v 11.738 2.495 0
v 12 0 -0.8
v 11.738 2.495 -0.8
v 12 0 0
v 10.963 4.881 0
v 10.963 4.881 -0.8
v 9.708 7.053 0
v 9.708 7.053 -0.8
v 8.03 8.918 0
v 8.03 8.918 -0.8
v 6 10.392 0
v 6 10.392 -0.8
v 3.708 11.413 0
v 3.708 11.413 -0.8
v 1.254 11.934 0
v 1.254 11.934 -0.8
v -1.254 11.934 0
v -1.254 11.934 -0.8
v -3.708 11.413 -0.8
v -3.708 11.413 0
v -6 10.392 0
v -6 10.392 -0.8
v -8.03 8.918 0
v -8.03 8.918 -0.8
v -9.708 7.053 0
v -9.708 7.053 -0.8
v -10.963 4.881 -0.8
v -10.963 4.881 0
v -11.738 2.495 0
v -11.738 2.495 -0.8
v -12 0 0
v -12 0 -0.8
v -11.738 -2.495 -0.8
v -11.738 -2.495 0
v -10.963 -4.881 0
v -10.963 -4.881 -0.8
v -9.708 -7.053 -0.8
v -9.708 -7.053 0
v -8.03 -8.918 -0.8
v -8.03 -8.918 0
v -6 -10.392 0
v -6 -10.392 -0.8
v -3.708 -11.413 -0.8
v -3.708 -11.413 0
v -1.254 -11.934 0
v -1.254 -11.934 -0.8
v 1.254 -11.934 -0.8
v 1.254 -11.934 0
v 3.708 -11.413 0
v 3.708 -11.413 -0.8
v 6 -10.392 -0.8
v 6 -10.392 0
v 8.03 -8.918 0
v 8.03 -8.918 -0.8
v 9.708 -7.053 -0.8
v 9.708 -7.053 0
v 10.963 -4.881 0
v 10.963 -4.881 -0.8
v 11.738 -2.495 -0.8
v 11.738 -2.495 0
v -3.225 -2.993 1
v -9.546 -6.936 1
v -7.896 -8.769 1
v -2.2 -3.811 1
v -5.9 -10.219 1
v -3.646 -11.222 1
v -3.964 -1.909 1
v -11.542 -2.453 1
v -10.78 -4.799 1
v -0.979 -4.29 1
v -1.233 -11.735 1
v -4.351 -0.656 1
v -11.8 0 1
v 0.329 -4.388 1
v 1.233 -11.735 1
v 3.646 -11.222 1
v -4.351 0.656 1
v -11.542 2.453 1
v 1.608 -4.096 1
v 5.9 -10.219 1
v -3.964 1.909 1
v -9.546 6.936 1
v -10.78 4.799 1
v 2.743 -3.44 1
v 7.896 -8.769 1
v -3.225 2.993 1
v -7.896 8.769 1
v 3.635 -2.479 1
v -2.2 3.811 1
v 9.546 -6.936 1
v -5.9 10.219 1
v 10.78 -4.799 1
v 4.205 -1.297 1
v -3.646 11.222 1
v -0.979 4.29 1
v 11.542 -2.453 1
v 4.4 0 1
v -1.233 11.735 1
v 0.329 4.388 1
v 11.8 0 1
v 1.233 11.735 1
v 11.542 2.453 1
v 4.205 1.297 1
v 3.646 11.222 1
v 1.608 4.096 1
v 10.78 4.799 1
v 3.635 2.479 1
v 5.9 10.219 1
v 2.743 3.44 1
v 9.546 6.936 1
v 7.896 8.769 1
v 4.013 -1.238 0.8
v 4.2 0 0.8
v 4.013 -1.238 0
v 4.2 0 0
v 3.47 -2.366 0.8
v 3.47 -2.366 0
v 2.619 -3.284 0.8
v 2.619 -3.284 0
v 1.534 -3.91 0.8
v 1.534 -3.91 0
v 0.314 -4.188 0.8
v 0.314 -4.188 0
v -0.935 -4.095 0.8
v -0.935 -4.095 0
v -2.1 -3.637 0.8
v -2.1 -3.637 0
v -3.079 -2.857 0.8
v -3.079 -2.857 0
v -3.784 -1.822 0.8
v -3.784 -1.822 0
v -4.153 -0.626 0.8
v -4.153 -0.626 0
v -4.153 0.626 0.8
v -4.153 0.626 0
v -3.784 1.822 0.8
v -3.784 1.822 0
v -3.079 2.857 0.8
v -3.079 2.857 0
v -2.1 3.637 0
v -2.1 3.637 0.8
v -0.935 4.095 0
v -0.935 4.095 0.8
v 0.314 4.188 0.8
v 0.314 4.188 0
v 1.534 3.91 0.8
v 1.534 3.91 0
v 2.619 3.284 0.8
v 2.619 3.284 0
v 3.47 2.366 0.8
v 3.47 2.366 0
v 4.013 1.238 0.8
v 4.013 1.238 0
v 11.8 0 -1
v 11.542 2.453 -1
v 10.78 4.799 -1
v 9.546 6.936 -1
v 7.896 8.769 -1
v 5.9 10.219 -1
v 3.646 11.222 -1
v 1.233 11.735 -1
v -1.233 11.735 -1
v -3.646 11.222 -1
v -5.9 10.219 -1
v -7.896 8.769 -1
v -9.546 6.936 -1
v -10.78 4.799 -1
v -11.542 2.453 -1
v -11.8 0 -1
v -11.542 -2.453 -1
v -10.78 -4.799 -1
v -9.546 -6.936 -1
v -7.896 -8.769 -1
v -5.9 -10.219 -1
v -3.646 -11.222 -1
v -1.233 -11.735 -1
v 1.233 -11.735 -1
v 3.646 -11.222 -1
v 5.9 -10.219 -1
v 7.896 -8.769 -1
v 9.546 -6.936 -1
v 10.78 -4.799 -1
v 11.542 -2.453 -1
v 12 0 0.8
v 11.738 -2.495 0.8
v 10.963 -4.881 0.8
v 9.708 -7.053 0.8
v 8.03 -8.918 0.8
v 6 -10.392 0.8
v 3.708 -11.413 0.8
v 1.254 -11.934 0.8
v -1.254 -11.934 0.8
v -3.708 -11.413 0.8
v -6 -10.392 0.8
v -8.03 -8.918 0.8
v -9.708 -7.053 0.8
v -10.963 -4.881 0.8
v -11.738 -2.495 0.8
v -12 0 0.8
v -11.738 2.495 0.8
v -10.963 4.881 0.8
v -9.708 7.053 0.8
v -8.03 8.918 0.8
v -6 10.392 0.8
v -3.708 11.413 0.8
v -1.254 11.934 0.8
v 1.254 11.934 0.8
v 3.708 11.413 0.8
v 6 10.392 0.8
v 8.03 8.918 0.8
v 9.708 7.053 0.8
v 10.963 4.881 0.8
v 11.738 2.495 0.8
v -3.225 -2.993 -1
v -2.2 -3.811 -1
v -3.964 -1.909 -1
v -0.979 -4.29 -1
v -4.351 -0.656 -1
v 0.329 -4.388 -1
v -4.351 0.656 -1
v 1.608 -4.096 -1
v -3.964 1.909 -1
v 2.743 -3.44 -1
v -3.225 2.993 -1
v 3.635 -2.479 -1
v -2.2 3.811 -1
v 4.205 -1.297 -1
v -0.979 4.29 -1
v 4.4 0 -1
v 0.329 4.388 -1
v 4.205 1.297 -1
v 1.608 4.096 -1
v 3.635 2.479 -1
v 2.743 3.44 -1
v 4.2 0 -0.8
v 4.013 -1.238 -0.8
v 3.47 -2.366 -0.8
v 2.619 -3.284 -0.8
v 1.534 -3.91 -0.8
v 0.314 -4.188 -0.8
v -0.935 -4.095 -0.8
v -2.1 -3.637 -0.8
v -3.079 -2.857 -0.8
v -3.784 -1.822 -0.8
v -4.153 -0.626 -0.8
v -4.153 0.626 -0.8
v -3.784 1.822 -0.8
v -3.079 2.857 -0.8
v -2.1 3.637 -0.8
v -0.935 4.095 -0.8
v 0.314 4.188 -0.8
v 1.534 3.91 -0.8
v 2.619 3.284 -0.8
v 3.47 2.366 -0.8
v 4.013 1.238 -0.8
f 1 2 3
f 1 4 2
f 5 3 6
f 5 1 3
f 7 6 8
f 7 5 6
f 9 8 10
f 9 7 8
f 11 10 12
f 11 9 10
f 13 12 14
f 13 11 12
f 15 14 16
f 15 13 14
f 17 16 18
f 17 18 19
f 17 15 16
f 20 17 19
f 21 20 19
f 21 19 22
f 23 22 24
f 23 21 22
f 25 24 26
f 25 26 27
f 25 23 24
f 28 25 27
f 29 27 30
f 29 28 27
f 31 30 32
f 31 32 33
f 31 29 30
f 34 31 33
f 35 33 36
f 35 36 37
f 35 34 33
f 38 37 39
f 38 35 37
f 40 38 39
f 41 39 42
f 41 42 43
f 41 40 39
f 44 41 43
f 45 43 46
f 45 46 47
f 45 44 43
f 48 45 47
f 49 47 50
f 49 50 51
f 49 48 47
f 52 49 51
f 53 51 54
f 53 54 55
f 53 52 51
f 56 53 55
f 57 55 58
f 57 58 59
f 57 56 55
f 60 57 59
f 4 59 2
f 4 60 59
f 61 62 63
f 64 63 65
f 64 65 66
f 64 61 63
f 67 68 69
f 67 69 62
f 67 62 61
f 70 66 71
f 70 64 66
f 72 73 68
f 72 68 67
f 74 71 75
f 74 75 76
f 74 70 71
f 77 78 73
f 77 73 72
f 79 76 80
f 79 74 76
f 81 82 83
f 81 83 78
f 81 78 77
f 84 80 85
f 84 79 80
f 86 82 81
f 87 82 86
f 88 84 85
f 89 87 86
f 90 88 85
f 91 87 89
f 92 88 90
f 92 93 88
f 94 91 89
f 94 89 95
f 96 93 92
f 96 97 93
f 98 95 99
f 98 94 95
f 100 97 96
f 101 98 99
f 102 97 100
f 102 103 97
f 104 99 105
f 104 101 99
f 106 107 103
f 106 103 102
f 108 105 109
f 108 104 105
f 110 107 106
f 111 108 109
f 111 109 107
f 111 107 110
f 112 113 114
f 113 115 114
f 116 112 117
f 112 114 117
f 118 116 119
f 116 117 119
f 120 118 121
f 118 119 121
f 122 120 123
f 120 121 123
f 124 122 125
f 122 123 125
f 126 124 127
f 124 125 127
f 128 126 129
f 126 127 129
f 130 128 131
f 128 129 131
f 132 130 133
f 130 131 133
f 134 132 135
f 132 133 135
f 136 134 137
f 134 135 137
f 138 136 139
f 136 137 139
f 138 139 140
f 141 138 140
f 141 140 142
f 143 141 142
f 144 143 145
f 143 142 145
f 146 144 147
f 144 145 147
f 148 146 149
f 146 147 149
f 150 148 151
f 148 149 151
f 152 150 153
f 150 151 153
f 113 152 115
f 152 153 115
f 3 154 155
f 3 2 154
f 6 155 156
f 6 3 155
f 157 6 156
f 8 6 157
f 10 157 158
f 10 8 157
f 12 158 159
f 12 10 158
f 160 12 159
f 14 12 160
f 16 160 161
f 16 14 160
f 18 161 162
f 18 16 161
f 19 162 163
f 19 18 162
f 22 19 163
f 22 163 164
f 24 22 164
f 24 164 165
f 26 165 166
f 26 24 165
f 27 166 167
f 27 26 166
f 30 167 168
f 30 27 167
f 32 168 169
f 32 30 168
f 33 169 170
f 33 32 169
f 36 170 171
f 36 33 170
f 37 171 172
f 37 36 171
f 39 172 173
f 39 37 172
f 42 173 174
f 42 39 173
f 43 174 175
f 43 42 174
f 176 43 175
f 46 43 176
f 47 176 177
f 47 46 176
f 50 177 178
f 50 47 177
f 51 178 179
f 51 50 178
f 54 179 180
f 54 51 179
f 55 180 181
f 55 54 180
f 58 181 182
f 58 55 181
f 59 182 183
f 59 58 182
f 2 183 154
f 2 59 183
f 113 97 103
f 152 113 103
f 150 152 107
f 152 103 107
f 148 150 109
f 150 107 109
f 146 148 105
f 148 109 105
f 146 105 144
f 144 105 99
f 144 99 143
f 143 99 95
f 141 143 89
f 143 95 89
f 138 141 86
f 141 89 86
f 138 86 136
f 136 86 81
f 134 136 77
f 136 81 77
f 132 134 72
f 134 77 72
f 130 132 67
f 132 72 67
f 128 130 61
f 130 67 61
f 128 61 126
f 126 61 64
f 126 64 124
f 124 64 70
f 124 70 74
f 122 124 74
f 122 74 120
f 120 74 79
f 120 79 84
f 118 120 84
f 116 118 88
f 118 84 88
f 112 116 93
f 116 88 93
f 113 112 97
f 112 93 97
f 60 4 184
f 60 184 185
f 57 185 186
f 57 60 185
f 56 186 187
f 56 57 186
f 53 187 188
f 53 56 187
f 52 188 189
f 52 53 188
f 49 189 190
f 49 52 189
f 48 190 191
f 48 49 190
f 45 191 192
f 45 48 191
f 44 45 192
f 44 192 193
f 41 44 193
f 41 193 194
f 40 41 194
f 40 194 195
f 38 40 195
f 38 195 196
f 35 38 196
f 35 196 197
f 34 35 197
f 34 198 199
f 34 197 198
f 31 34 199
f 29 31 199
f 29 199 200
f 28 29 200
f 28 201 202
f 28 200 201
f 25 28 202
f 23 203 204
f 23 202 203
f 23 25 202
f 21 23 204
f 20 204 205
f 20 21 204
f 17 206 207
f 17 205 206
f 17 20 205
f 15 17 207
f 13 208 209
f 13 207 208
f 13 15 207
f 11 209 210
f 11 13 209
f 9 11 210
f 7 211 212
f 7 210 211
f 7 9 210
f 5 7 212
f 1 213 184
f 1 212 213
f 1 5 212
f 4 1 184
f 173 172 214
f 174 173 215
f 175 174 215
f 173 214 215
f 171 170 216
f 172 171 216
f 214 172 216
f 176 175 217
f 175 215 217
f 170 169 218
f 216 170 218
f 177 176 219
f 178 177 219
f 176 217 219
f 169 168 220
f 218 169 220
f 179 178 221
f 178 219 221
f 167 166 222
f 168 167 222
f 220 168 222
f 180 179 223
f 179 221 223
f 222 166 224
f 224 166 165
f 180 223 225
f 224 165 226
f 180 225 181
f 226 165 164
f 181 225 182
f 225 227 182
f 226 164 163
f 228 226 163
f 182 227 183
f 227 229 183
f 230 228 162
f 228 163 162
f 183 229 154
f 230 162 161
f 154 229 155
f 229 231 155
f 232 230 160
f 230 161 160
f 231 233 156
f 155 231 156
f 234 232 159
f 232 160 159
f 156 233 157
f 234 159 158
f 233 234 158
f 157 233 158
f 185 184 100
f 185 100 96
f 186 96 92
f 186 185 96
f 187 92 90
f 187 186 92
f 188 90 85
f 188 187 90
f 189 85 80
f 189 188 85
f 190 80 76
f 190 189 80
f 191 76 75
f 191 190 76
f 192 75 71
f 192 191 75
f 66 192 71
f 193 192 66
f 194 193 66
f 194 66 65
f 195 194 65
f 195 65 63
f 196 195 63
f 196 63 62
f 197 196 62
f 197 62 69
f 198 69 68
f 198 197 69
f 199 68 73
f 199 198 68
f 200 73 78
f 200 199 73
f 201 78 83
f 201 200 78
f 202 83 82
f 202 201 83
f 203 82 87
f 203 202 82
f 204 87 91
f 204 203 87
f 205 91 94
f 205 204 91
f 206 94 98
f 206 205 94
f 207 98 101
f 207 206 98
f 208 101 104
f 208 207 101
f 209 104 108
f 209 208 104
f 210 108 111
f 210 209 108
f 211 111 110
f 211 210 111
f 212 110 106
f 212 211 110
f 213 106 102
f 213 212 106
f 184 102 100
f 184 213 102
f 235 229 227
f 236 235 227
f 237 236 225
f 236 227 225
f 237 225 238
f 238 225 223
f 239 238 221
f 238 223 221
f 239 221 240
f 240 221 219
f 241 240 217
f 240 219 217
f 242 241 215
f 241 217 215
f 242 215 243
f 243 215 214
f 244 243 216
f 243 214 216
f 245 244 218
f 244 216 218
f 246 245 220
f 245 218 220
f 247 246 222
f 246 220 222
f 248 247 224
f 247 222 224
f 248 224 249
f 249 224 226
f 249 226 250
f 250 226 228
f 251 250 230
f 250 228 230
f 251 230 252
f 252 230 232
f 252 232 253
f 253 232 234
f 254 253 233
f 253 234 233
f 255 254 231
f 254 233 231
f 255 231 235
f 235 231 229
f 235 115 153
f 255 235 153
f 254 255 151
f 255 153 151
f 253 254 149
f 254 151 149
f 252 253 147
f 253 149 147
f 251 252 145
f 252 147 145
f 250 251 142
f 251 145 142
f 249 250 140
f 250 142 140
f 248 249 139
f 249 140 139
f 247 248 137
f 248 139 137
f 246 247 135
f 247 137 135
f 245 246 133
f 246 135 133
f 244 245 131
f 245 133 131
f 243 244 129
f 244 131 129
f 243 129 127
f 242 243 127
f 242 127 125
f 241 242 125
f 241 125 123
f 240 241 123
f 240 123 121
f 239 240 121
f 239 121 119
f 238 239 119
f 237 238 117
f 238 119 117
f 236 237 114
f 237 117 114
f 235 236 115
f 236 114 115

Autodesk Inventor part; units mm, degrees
ref_plane "YZ Plane" through (0, 0, 0) normal (1, 0, 0) x (0, 1, 0)
ref_plane "XZ Plane" through (0, 0, 0) normal (0, 1, 0) x (-1, 0, 0)
ref_plane "XY Plane" through (0, 0, 0) normal (0, 0, 1) x (1, 0, 0)
sketch "Skizze1" plane through (0, 0, 0) normal (0, 0, 1) x (1, 0, 0)
  circle A0 centre (0, 0) radius 4.2
  circle A1 centre (0, 0) radius 12
  dimension "d0" = 24
  dimension "d1" = 8.4
extrude "Extrusion1" add sketch "Skizze1" along normal mid plane 2
chamfer "Fase1" distance 0.2 angle 45 4 edges at (-12, 0, 1) (-12, 0, -1) (-4.2, 0, 1) (-4.2, 0, -1)
properties part number "900-80-WASHERS-DIN9021-M8" material "Edelstahl"
